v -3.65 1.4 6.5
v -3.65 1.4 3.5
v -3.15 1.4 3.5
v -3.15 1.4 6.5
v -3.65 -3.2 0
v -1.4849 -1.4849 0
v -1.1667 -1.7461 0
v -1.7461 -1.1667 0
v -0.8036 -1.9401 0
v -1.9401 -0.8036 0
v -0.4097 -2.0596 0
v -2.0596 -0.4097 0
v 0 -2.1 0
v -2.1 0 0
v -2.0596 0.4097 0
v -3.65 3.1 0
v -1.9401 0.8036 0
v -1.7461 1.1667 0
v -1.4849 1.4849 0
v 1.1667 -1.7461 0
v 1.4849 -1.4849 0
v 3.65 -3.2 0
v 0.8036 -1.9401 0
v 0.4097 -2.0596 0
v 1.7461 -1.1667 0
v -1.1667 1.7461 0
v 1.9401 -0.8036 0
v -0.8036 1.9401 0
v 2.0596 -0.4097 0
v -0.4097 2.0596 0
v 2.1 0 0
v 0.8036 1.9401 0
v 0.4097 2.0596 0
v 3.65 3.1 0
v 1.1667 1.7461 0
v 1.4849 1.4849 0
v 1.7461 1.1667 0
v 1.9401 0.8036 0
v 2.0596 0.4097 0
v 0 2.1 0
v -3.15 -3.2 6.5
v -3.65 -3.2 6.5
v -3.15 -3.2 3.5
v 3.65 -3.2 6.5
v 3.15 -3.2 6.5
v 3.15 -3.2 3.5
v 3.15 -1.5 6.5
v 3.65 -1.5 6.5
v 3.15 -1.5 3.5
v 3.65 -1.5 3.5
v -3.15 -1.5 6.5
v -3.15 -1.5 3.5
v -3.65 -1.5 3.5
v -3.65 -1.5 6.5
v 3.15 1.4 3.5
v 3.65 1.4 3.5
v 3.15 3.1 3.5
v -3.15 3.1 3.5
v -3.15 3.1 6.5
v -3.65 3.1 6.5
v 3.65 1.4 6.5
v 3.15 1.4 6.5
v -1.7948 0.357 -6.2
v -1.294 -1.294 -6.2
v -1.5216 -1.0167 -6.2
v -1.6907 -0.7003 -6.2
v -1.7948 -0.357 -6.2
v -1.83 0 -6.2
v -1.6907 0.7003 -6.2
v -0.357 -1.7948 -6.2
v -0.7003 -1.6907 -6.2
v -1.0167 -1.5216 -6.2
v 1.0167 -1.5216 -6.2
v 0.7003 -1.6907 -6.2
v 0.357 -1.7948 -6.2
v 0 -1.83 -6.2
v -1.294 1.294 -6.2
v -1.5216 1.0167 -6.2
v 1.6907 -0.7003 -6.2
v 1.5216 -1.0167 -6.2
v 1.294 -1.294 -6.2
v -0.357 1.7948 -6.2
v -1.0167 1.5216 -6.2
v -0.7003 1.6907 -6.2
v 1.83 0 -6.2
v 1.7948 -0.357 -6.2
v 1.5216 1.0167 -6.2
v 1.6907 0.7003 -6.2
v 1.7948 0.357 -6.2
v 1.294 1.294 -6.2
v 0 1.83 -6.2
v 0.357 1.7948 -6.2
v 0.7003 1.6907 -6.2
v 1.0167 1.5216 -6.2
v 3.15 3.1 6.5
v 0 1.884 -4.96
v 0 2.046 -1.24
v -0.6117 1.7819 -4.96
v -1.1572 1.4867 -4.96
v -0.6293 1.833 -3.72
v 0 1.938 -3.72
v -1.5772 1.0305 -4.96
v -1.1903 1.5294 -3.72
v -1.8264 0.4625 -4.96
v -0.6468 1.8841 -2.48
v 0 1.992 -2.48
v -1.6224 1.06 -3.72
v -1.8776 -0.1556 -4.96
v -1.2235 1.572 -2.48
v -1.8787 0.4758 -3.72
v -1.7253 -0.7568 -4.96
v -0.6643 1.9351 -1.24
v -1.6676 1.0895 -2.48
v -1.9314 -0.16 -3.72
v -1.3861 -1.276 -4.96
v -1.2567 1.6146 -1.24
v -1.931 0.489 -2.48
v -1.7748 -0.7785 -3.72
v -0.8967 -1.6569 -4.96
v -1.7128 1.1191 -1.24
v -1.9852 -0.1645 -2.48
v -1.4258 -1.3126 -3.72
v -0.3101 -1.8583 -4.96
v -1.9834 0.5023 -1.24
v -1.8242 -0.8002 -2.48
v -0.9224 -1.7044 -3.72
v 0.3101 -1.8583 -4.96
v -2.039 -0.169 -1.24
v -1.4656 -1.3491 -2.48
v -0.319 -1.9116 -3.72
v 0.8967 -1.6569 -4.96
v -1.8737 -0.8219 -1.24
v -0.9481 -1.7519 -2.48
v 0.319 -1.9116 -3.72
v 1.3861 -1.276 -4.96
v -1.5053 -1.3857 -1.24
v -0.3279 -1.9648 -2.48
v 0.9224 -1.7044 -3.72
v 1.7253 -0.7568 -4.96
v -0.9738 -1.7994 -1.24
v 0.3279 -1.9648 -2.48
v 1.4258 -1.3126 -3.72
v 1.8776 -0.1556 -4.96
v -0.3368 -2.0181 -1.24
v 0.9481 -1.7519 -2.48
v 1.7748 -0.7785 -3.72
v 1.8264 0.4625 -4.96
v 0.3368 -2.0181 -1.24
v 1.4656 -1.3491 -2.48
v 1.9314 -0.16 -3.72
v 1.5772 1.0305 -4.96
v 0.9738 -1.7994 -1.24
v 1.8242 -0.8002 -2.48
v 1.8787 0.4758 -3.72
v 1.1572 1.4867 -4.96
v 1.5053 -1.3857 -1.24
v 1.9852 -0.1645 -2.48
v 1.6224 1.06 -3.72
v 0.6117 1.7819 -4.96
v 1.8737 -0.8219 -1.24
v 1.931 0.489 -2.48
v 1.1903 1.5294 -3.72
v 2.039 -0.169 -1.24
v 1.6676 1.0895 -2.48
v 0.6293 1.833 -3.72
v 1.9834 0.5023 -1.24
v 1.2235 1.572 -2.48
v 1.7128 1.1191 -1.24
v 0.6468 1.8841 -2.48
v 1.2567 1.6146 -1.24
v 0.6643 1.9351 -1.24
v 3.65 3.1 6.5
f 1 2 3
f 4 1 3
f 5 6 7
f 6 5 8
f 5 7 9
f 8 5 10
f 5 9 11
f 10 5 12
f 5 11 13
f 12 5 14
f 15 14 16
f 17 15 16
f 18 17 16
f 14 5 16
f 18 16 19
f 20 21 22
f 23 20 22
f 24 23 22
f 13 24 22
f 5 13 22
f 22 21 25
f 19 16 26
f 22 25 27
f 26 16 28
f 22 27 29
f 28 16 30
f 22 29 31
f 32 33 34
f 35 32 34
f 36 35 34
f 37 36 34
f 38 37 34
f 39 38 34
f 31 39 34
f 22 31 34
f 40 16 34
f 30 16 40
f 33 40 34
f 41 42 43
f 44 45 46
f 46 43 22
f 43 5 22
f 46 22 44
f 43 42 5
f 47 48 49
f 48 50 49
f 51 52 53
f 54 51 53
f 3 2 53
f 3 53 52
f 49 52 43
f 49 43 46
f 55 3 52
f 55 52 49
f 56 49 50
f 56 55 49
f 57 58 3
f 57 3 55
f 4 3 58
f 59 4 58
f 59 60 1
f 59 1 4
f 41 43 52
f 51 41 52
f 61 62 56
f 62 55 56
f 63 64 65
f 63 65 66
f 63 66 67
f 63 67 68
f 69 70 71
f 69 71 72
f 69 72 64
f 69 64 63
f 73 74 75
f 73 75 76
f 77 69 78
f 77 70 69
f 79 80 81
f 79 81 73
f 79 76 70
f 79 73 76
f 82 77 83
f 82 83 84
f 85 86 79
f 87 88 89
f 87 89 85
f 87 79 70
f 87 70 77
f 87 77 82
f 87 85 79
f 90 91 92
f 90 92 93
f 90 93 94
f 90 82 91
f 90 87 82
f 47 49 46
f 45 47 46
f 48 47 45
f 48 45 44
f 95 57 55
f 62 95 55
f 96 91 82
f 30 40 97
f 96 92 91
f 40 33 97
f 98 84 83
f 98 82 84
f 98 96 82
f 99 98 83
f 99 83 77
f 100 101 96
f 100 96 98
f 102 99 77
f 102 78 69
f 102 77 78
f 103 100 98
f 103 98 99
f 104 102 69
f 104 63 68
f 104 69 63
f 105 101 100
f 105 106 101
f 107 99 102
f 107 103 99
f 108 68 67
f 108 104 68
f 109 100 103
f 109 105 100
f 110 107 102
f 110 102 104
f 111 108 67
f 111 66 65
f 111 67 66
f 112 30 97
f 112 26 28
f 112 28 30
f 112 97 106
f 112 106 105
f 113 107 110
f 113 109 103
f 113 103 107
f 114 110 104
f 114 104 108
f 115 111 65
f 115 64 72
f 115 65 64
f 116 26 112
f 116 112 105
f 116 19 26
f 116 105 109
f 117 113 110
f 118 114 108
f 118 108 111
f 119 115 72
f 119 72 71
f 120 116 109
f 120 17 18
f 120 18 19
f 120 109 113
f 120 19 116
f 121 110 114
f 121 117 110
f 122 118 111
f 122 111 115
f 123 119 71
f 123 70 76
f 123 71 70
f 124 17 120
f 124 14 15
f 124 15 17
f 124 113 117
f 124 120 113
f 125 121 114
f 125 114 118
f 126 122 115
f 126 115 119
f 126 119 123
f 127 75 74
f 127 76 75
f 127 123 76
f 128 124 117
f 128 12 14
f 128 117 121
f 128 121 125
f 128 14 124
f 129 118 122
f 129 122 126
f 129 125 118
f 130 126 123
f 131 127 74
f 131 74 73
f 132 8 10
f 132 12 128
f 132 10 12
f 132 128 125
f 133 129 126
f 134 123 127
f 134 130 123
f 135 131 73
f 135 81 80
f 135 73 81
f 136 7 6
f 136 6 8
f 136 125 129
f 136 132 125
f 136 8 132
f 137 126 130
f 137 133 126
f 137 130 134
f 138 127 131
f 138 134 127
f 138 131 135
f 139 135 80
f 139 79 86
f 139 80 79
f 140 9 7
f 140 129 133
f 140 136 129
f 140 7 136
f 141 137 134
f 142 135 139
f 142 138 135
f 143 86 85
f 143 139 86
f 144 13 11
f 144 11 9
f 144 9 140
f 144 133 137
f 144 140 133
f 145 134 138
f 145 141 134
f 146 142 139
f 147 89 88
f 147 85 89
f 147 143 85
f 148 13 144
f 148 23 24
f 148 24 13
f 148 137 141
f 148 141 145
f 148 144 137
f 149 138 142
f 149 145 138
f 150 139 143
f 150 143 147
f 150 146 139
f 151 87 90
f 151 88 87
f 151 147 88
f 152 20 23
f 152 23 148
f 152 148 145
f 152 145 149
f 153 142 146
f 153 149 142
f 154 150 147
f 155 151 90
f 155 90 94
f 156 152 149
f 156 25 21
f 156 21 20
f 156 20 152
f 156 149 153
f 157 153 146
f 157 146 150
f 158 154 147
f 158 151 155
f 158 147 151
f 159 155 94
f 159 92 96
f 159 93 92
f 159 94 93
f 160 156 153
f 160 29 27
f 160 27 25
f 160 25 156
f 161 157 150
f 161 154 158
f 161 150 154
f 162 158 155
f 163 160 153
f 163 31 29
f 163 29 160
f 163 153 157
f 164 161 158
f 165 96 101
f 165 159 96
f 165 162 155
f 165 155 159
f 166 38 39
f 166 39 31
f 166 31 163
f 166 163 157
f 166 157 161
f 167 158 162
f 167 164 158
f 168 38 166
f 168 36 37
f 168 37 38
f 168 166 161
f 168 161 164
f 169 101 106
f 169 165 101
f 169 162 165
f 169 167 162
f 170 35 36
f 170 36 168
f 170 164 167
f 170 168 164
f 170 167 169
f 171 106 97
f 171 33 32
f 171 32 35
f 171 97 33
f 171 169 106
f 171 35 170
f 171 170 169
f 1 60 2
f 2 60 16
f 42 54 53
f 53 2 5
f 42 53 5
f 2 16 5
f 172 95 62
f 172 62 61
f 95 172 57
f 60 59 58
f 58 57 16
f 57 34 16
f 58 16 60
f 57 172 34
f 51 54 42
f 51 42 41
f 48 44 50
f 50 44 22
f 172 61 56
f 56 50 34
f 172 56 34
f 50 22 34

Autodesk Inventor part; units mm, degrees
ref_plane "YZ Plane" through (0, 0, 0) normal (1, 0, 0) x (0, 1, 0)
ref_plane "XZ Plane" through (0, 0, 0) normal (0, 1, 0) x (-1, 0, 0)
ref_plane "XY Plane" through (0, 0, 0) normal (0, 0, 1) x (1, 0, 0)
sketch "Esboço1" plane through (0, 0, 0) normal (0, 0, 1) x (1, 0, 0)
  line L0 (-3.65, -3.2) -> (3.65, -3.2)
  line L1 (3.65, -3.2) -> (3.65, 3.1)
  line L2 (3.65, 3.1) -> (-3.65, 3.1)
  line L3 (-3.65, 3.1) -> (-3.65, -3.2)
  line L4 (0, 3.1) -> (0, 0)
  dimension "d0" = 7.3
  dimension "d1" = 6.3
extrude "Extrusão1" add sketch "Esboço1" along normal blind 3.5
sketch "Esboço2" plane through (0, 0, 0) normal (1, 0, 0) x (0, 1, 0)
  line L0 (0, 0) -> (0, -6.2)
  line L1 (0, 0) -> (2.1, 0)
  line L2 (-3.2, 0) -> (3.1, 0) projected
  line L3 (0, -6.2) -> (1.83, -6.2)
  line L4 (1.83, -6.2) -> (2.1, 0)
  dimension "d4" = 6.2
  dimension "d5" = 2.1
  dimension "d6" = 1.83
revolve "Revolução1" add sketch "Esboço2" angle 360 about axis through (0, 0, 0) along (0, 0, -1)
sketch "Esboço3" plane through (0, 0, 3.5) normal (0, 0, 1) x (1, 0, 0)
  line L0 (3.65, 3.1) -> (-3.65, 3.1) projected
  line L1 (3.65, 3.1) -> (3.15, 3.1)
  line L2 (3.15, 3.1) -> (3.15, 1.4)
  line L3 (3.15, 1.4) -> (3.65, 1.4)
  line L4 (3.65, 1.4) -> (3.65, 3.1)
  line L5 (-3.65, -3.2) -> (3.65, -3.2) projected
  line L6 (3.65, -1.5) -> (3.15, -1.5)
  line L7 (3.15, -1.5) -> (3.15, -3.2)
  line L8 (3.15, -3.2) -> (3.65, -3.2)
  line L9 (3.65, -3.2) -> (3.65, -1.5)
  line L10 (-3.15, -1.5) -> (-3.65, -1.5)
  line L11 (-3.65, -1.5) -> (-3.65, -3.2)
  line L12 (-3.65, -3.2) -> (-3.15, -3.2)
  line L13 (-3.15, -3.2) -> (-3.15, -1.5)
  line L14 (-3.65, 3.1) -> (-3.65, -3.2) projected
  line L15 (-3.65, 3.1) -> (-6.7444, 5.2741)
  line L16 (-3.15, 3.1) -> (-3.65, 3.1)
  line L17 (-3.65, 3.1) -> (-3.65, 1.4)
  line L18 (-3.65, 1.4) -> (-3.15, 1.4)
  line L19 (-3.15, 1.4) -> (-3.15, 3.1)
  line L20 (3.65, 3.1) -> (5.0024, 4.4542)
  line L21 (3.65, -3.2) -> (6.7193, -5.088)
  line L22 (-3.65, -3.2) -> (-6.2831, -4.7356)
  point P0 (0, 0)
  point P1 (-3.15, -3.2)
  point P2 (-3.65, 1.4)
  dimension "d8" = 0.5
  dimension "d9" = 1.7
  dimension "d10" = 0.5
  dimension "d11" = 1.7
  dimension "d14" = 0.5
  dimension "d15" = 1.7
  dimension "d19" = 0.5
  dimension "d20" = 1.7
extrude "Extrusão2" add sketch "Esboço3" along normal blind 3
properties part number "pushbottom3.5mm"
